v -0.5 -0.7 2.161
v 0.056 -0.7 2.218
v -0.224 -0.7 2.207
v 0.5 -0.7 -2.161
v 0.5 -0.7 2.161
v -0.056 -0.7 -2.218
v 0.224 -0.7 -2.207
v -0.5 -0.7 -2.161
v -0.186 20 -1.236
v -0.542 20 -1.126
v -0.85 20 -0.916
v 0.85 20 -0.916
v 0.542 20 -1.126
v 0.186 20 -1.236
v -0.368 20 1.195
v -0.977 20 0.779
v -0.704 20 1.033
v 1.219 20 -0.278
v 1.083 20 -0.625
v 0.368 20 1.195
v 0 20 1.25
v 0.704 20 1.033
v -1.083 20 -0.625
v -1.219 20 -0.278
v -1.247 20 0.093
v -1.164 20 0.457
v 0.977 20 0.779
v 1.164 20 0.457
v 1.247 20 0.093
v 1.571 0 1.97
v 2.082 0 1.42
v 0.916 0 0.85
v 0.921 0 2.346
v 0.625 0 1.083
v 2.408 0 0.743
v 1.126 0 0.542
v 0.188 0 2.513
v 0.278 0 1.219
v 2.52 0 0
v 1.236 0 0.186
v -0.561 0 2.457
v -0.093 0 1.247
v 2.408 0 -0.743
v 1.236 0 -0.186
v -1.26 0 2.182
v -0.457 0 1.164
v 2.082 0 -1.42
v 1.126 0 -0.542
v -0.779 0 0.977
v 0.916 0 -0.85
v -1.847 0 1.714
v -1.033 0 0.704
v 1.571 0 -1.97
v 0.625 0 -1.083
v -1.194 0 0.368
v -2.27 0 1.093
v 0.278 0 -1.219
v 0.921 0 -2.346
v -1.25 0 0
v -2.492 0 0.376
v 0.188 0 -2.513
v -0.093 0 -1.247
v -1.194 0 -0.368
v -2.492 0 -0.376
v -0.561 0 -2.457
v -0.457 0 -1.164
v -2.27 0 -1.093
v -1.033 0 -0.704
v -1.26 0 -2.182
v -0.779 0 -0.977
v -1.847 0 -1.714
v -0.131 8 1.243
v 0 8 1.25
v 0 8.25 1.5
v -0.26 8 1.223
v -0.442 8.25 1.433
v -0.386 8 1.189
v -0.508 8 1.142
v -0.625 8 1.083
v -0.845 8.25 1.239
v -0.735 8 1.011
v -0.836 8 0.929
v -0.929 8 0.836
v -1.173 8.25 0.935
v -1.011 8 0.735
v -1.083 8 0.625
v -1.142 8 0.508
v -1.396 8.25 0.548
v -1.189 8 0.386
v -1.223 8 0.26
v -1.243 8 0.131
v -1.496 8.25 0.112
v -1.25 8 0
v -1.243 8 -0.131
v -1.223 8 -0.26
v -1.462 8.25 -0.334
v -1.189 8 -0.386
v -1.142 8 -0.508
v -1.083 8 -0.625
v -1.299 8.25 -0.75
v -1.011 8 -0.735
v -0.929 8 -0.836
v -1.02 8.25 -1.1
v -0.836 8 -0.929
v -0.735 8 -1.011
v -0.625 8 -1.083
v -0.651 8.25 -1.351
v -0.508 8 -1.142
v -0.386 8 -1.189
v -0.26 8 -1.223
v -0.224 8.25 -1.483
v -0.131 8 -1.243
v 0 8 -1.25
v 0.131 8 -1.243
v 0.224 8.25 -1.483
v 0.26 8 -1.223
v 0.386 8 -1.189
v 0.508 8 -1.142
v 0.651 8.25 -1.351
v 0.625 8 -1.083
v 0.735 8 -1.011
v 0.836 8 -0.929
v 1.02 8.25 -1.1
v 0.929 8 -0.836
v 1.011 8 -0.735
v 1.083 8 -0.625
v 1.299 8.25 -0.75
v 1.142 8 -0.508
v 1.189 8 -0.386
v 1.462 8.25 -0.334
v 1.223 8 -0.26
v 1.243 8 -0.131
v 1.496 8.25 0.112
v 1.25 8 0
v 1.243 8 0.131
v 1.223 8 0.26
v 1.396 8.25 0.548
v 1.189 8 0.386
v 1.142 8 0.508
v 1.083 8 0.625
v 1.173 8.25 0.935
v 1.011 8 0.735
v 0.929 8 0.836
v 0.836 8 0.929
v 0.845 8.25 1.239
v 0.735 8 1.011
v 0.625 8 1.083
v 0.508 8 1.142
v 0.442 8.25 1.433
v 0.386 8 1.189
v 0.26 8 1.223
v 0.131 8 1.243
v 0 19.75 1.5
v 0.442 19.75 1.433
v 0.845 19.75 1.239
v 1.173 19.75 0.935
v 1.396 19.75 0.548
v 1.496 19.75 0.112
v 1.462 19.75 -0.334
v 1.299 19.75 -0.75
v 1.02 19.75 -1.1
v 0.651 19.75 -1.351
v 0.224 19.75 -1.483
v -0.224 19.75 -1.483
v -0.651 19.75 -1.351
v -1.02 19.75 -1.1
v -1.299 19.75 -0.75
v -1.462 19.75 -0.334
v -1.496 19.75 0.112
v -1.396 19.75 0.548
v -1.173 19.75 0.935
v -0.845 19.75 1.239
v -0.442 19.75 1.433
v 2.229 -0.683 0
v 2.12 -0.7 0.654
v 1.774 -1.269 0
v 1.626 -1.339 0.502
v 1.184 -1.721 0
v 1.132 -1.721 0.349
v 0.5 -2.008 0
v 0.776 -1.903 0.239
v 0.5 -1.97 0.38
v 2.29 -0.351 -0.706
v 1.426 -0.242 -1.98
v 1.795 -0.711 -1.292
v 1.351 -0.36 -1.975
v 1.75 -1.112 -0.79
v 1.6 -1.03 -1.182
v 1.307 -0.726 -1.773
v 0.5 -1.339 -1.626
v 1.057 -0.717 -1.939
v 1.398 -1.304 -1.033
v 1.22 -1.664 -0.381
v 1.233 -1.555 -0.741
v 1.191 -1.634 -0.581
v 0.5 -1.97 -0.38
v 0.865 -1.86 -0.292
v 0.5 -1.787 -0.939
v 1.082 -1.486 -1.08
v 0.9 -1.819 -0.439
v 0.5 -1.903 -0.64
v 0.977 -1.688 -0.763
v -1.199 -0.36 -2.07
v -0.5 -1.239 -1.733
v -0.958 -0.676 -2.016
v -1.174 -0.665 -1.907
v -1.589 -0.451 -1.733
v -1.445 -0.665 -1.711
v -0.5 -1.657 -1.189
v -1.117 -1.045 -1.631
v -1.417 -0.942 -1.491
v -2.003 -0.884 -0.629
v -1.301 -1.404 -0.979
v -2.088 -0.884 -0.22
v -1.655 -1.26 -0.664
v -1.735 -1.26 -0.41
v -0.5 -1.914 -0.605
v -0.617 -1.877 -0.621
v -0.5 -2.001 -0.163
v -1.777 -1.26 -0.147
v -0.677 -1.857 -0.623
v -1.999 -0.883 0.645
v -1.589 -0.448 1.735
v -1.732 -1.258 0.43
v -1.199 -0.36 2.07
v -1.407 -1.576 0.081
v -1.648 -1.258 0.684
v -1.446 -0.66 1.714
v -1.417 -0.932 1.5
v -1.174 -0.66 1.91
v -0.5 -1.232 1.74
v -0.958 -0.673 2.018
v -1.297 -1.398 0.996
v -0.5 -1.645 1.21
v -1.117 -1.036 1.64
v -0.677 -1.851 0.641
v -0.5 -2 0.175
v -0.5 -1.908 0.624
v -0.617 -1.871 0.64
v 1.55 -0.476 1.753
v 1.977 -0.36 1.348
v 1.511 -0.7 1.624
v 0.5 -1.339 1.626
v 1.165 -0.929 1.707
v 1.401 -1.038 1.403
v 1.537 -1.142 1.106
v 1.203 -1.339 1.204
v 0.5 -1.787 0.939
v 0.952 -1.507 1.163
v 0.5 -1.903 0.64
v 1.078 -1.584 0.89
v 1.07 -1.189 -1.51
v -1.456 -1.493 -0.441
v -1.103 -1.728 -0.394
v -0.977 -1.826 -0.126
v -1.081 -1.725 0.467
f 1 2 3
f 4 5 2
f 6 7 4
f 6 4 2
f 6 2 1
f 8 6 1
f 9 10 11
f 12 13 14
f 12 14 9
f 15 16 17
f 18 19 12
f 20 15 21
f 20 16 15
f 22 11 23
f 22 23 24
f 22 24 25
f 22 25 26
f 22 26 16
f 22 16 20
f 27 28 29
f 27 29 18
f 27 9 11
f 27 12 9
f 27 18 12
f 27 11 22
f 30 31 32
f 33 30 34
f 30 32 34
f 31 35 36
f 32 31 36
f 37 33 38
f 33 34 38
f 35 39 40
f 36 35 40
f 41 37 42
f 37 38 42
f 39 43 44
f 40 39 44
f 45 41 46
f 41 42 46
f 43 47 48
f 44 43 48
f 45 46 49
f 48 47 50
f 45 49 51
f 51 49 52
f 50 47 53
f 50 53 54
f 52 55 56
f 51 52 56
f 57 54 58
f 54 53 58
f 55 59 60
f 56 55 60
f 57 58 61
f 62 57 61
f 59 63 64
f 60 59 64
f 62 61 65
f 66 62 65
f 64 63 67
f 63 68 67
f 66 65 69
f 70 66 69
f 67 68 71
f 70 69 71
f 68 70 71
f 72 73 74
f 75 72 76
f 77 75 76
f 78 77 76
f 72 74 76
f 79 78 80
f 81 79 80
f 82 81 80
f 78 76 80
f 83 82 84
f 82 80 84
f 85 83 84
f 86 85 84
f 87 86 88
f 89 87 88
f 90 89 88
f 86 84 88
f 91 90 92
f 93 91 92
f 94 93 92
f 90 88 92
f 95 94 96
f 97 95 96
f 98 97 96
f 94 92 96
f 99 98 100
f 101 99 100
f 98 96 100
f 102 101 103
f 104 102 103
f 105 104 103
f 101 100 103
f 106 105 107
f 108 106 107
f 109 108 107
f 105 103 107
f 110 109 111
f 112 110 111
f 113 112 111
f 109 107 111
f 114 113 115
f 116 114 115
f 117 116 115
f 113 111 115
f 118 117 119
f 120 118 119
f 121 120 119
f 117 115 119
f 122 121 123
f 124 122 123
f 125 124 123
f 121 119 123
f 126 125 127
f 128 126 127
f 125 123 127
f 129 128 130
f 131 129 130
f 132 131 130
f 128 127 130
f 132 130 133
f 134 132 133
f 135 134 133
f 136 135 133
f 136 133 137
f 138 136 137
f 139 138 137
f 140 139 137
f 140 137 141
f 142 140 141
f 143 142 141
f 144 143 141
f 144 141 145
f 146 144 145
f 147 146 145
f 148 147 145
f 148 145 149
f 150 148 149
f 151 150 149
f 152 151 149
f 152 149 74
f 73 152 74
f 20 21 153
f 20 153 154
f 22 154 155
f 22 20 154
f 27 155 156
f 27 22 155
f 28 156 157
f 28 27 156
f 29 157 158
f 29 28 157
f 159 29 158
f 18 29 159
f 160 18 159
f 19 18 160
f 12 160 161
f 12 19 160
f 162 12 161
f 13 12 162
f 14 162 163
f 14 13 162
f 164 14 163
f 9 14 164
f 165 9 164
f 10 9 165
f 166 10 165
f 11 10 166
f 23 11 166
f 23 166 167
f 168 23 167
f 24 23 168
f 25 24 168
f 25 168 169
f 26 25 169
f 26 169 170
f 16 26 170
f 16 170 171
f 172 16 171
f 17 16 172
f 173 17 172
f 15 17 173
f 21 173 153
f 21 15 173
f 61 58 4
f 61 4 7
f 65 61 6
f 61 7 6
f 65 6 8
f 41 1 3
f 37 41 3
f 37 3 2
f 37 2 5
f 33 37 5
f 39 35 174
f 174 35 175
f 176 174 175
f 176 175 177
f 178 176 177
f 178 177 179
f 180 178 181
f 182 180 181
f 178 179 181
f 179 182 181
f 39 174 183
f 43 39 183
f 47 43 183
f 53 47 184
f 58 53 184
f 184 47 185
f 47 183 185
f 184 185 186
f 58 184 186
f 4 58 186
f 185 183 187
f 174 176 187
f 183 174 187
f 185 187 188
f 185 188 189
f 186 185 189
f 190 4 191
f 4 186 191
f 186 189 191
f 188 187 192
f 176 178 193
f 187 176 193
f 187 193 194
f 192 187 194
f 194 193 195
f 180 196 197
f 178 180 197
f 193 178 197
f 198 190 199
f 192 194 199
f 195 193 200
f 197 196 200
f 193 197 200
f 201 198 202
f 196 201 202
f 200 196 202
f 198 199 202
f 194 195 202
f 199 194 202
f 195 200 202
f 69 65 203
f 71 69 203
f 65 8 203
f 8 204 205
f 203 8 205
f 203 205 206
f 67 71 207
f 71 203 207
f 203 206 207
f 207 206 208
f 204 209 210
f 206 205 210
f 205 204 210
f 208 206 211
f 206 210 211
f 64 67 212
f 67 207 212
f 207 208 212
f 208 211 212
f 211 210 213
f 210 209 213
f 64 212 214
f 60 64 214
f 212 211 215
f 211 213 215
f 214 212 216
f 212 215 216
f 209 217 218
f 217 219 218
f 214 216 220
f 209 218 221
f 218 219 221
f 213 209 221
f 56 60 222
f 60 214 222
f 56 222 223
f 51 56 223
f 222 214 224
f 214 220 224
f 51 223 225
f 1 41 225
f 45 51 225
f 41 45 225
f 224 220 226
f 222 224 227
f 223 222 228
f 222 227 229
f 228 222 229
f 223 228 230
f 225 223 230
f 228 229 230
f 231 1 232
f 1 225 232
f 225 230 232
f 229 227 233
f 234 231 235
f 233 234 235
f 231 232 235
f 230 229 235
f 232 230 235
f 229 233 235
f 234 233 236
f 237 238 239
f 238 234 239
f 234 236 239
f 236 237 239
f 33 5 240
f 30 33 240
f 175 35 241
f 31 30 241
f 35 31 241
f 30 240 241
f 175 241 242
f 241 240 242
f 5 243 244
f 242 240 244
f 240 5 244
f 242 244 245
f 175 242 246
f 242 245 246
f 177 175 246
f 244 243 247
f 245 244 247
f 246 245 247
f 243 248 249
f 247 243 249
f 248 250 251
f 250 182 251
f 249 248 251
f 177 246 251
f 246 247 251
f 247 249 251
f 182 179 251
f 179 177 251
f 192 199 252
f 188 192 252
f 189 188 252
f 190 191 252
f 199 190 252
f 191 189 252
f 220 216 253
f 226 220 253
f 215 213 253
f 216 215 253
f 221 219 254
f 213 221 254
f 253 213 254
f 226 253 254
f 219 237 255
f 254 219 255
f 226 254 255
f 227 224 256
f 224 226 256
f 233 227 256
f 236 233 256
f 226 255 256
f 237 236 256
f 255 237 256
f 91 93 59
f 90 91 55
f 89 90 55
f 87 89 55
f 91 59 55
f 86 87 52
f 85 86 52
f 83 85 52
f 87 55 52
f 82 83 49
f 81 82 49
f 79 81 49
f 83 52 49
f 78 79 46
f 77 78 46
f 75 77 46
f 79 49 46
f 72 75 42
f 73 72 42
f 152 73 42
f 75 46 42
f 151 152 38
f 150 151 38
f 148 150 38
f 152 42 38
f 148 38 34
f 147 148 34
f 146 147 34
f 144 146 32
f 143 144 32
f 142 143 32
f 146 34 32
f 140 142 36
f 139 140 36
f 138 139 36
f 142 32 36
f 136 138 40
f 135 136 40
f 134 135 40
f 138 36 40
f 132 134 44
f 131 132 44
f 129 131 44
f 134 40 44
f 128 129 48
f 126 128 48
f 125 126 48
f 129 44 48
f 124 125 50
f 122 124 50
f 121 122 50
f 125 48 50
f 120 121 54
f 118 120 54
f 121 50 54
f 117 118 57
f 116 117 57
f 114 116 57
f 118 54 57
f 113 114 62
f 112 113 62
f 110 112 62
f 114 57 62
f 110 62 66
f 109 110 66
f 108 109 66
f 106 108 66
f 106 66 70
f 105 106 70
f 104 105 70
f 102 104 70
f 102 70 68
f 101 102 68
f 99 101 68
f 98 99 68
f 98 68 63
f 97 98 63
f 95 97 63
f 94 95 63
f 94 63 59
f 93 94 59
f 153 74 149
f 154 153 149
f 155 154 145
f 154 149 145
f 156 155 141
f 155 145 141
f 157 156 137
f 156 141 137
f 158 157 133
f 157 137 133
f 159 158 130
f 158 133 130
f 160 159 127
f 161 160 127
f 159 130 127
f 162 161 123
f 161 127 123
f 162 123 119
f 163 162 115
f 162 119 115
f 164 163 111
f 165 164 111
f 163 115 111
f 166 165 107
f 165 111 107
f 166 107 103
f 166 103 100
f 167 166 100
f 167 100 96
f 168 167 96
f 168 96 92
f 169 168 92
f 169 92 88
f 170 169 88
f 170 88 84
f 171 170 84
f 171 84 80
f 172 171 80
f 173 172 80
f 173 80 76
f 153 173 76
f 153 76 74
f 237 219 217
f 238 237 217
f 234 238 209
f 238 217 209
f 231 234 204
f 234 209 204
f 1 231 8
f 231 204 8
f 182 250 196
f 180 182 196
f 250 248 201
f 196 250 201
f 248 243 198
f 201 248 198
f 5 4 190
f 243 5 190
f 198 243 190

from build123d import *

# Parameters (mm, degrees)
SKETCH1_R               = 1.5
BOSS_EXTRUDE1_DEPTH     = 20
CUT_EXTRUDE1_DEPTH      = 21.315038789
CUT_EXTRUDE1_DEPTH_BACK = 21.315038789
SKETCH4_R               = 2.52
SKETCH4_R_2             = 1.25
CUT_EXTRUDE2_DEPTH      = 8
CHAMFER1_SIZE           = 0.25


with BuildPart() as part:
    # Sketch1 → Boss-Extrude1 (new body)
    with BuildSketch(Plane(origin=(0, 0, 0), x_dir=(1, 0, 0), z_dir=(0, 1, 0))):
        with Locations(Location((0, 0, 0), (0, 0, 270))):
            Circle(SKETCH1_R)
    extrude(amount=BOSS_EXTRUDE1_DEPTH)

    # Sketch2 → Revolve1 (revolve)
    with BuildSketch(Plane.XY, mode=Mode.PRIVATE) as revolve1_sk:
        with BuildLine():
            Line((0, 0), (-2.52, 0))
            ThreePointArc((-2.52, 0), (-1.585449748, -1.440539697), (0, -2.1))
            Line((0, -2.1), (0, 0))
        make_face()
    revolve(revolve1_sk.sketch.rotate(Axis((0, -2.1, 0), (0, 1, 0)), 180), axis=Axis((0, -2.1, 0), (0, 1, 0)))

    # Sketch3 → Cut-Extrude1 (cut, two sides: drawn at the far end of the back side and taken through both)
    with BuildSketch(Plane.XY.offset(-CUT_EXTRUDE1_DEPTH_BACK)):
        Polygon((-0.5, -0.7), (0, -0.7), (0.5, -0.7), (0.5, -4.6380618), (-0.5, -4.6380618), align=None)
    extrude(amount=CUT_EXTRUDE1_DEPTH + CUT_EXTRUDE1_DEPTH_BACK, mode=Mode.SUBTRACT)

    # Sketch4 → Cut-Extrude2 (cut)
    with BuildSketch(Plane(origin=(0, 0, 0), x_dir=(1, 0, 0), z_dir=(0, 1, 0))):
        Circle(SKETCH4_R)
        with Locations(Location((0, 0, 0), (0, 0, 180))):
            Circle(SKETCH4_R_2, mode=Mode.SUBTRACT)
    extrude(amount=CUT_EXTRUDE2_DEPTH, mode=Mode.SUBTRACT)

    # Chamfer1
    chamfer1_edges = [part.edges().sort_by_distance(p)[0] for p in [
        (0, 8, -1.5),
        (0, 20, -1.5),
    ]]
    chamfer(chamfer1_edges, length=CHAMFER1_SIZE - 0.0001)  # a hair under: the kernel refuses the full size


solid = part.part
